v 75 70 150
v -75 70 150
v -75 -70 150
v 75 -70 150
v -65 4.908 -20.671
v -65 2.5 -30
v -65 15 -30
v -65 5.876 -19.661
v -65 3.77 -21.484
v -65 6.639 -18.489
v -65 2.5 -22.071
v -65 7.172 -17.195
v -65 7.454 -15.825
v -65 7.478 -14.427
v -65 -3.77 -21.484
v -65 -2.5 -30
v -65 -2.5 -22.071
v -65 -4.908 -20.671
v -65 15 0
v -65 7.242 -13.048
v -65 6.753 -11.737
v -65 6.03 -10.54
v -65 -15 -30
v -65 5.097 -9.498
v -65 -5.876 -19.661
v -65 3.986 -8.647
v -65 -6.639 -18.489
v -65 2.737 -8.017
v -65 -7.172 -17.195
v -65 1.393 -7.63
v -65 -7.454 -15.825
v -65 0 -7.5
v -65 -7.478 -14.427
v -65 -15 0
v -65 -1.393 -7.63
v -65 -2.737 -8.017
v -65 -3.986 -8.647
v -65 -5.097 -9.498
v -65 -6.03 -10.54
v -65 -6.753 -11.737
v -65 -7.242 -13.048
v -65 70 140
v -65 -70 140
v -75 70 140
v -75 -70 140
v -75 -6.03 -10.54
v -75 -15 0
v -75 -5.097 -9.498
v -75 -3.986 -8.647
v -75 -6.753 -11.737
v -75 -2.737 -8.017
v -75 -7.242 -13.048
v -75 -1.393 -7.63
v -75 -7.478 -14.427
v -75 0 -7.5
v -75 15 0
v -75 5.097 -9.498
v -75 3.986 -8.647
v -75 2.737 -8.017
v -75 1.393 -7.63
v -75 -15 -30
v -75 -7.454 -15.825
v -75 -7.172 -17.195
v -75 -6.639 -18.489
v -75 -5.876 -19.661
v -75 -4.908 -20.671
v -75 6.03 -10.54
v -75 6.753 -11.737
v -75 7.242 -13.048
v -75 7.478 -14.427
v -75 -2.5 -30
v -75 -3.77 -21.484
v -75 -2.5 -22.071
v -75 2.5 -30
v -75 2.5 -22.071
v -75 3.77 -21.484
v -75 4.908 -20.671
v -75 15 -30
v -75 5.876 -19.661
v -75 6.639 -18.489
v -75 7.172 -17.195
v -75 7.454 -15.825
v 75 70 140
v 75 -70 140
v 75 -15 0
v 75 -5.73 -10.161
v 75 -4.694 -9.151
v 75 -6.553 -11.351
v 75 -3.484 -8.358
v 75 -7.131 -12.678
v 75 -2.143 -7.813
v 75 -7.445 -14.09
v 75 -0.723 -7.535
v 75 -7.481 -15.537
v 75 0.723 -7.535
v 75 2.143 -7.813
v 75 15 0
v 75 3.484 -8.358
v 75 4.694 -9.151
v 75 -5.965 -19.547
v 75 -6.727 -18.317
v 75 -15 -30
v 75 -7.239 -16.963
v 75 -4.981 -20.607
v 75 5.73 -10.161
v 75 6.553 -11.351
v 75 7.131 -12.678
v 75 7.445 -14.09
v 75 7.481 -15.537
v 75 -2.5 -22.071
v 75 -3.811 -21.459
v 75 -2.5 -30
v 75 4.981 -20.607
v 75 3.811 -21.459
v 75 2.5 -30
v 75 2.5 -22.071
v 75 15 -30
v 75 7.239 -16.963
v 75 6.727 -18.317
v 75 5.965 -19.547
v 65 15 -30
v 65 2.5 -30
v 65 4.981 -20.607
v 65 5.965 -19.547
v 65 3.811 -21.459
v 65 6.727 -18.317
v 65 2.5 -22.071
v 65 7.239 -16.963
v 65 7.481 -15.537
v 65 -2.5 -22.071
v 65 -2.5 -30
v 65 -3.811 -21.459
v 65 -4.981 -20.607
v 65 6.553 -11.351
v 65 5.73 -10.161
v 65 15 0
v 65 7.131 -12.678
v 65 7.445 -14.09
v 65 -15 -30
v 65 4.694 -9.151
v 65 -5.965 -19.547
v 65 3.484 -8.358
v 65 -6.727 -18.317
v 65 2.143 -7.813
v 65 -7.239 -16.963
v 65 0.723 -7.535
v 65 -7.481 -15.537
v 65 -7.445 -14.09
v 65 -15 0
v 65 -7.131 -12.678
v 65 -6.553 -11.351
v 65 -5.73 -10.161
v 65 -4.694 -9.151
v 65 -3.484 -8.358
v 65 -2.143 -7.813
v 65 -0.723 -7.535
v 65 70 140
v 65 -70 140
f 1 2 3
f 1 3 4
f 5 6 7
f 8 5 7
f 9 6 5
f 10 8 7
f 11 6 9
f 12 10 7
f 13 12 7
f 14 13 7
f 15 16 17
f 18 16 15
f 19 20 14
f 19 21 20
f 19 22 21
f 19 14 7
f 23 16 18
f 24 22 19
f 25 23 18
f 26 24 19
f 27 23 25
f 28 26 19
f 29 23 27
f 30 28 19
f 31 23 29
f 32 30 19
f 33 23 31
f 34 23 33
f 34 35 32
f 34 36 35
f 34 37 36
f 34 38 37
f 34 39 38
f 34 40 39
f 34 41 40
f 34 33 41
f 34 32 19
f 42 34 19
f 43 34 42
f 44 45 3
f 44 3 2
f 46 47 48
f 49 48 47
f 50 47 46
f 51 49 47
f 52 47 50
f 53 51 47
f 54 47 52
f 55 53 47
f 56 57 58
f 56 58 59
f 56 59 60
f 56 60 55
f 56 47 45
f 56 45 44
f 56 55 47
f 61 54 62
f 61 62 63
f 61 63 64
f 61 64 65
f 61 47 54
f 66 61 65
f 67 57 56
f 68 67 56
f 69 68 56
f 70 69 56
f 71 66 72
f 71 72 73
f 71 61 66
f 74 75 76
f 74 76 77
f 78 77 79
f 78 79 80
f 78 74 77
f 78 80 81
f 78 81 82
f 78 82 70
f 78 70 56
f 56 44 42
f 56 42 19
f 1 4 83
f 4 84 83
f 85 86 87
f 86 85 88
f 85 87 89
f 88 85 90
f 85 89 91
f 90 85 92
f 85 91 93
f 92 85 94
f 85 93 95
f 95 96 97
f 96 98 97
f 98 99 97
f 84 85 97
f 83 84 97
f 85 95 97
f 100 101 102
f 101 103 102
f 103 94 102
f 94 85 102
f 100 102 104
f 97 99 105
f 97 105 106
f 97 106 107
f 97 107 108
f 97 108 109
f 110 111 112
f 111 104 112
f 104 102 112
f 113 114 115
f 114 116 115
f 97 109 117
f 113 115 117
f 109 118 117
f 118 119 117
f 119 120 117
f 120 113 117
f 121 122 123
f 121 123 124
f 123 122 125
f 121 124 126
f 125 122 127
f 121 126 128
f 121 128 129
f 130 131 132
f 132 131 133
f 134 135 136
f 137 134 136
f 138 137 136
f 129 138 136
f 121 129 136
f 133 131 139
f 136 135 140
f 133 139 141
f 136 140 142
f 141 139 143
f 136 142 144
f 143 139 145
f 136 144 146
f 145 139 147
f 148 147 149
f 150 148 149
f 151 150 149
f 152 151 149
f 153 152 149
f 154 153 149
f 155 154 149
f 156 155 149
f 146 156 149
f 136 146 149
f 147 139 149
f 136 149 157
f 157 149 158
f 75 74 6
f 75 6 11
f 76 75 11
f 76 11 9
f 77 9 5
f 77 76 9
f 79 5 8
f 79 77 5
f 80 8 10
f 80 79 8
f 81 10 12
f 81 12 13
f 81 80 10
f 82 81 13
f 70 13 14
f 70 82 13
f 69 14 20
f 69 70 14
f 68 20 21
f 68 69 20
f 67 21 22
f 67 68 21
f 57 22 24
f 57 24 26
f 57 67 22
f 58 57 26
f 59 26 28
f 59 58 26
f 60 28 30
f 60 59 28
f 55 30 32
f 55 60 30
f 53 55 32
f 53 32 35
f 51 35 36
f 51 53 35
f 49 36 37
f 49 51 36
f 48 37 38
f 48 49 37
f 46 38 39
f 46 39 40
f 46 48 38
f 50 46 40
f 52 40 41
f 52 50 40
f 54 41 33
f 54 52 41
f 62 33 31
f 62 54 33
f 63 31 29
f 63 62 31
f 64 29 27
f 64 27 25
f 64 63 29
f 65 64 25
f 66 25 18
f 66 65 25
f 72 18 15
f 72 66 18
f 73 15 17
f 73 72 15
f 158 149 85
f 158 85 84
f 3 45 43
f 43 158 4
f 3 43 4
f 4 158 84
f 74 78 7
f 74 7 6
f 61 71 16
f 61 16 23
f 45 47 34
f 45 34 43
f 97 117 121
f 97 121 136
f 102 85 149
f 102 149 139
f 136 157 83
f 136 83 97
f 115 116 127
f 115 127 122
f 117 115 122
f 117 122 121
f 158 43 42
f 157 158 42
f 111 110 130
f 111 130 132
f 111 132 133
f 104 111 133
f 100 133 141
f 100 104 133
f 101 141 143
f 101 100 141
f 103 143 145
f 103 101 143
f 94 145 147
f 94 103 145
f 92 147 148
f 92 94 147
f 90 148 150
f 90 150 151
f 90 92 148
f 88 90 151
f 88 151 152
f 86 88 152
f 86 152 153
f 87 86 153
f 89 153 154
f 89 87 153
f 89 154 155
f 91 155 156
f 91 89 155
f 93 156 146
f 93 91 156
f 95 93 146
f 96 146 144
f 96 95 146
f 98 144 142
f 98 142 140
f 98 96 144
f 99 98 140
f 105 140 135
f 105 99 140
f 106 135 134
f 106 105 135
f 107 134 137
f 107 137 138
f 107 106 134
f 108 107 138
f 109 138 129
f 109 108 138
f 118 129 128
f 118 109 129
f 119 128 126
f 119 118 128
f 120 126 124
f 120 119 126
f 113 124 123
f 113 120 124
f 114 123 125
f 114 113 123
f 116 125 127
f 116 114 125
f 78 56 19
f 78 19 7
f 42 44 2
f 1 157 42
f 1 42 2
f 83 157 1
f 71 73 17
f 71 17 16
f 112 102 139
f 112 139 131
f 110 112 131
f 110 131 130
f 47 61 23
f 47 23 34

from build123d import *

# Parameters (mm, degrees)
SKETCH1_W               = 150
SKETCH1_H               = 140
SKETCH1_W_2             = 130
SKETCH1_H_2             = 120
BOSS_EXTRUDE1_DEPTH     = 150
BOSS_EXTRUDE2_DEPTH     = 10
BOSS_EXTRUDE3_DEPTH     = 10
SKETCH7_W               = 130
SKETCH7_H               = 150
CUT_EXTRUDE2_DEPTH      = 140
SKETCH8_W               = 10
SKETCH8_H               = 140
BOSS_EXTRUDE4_DEPTH     = 150
CUT_EXTRUDE3_DEPTH      = 1
CUT_EXTRUDE3_DEPTH_BACK = 150


with BuildPart() as part:
    # Sketch1 → Boss-Extrude1 (new body)
    with BuildSketch(Plane.XY):
        Rectangle(SKETCH1_W, SKETCH1_H)
        Rectangle(SKETCH1_W_2, SKETCH1_H_2, mode=Mode.SUBTRACT)
    extrude(amount=BOSS_EXTRUDE1_DEPTH)

    # Sketch3 → Boss-Extrude2 (add)
    with BuildSketch(Plane(origin=(75, 0, 0), x_dir=(0, 0, -1), z_dir=(1, 0, 0))):
        with BuildLine():
            Line((30, 15), (0, 15))
            Line((0, 15), (0, -15))
            Line((0, -15), (30, -15))
            Line((30, -15), (30, -2.5))
            Line((30, -2.5), (22.071067812, -2.5))
            ThreePointArc((22.071067812, -2.5), (7.5, 0), (22.071067812, 2.5))
            Line((22.071067812, 2.5), (30, 2.5))
            Line((30, 2.5), (30, 15))
        make_face()
    extrude(amount=-BOSS_EXTRUDE2_DEPTH)

    # Sketch4 → Boss-Extrude3 (add)
    with BuildSketch(Plane.ZY.offset(75)):
        with BuildLine():
            Line((0, -15), (0, 15))
            Line((0, 15), (-30, 15))
            Line((-30, 15), (-30, 2.5))
            Line((-30, 2.5), (-22.071067812, 2.5))
            ThreePointArc((-22.071067812, 2.5), (-13.73173516, 7.391989197), (-7.5, 0))
            ThreePointArc((-7.5, 0), (-13.73173516, -7.391989197), (-22.071067812, -2.5))
            Line((-22.071067812, -2.5), (-30, -2.5))
            Line((-30, -2.5), (-30, -15))
            Line((-30, -15), (0, -15))
        make_face()
    extrude(amount=-BOSS_EXTRUDE3_DEPTH)

    # Sketch7 → Cut-Extrude2 (cut)
    with BuildSketch(Plane.XZ.offset(70)):
        with Locations((0, 75)):
            Rectangle(SKETCH7_W, SKETCH7_H)
    extrude(amount=-CUT_EXTRUDE2_DEPTH, mode=Mode.SUBTRACT)

    # Sketch8 → Boss-Extrude4 (add)
    with BuildSketch(Plane.ZY.offset(75)):
        with Locations((145, 0)):
            Rectangle(SKETCH8_W, SKETCH8_H)
    extrude(amount=-BOSS_EXTRUDE4_DEPTH)

    # Sketch9 → Cut-Extrude3 (cut, two sides)
    with BuildSketch(Plane.ZY.offset(75)) as cut_extrude3_sk:
        Polygon((0, -15), (140, -70), (0, -70), align=None)
        Polygon((0, 15), (0, 70), (140, 70), align=None)
    extrude(amount=CUT_EXTRUDE3_DEPTH, mode=Mode.SUBTRACT)
    extrude(cut_extrude3_sk.sketch, amount=-CUT_EXTRUDE3_DEPTH_BACK, mode=Mode.SUBTRACT)


solid = part.part
